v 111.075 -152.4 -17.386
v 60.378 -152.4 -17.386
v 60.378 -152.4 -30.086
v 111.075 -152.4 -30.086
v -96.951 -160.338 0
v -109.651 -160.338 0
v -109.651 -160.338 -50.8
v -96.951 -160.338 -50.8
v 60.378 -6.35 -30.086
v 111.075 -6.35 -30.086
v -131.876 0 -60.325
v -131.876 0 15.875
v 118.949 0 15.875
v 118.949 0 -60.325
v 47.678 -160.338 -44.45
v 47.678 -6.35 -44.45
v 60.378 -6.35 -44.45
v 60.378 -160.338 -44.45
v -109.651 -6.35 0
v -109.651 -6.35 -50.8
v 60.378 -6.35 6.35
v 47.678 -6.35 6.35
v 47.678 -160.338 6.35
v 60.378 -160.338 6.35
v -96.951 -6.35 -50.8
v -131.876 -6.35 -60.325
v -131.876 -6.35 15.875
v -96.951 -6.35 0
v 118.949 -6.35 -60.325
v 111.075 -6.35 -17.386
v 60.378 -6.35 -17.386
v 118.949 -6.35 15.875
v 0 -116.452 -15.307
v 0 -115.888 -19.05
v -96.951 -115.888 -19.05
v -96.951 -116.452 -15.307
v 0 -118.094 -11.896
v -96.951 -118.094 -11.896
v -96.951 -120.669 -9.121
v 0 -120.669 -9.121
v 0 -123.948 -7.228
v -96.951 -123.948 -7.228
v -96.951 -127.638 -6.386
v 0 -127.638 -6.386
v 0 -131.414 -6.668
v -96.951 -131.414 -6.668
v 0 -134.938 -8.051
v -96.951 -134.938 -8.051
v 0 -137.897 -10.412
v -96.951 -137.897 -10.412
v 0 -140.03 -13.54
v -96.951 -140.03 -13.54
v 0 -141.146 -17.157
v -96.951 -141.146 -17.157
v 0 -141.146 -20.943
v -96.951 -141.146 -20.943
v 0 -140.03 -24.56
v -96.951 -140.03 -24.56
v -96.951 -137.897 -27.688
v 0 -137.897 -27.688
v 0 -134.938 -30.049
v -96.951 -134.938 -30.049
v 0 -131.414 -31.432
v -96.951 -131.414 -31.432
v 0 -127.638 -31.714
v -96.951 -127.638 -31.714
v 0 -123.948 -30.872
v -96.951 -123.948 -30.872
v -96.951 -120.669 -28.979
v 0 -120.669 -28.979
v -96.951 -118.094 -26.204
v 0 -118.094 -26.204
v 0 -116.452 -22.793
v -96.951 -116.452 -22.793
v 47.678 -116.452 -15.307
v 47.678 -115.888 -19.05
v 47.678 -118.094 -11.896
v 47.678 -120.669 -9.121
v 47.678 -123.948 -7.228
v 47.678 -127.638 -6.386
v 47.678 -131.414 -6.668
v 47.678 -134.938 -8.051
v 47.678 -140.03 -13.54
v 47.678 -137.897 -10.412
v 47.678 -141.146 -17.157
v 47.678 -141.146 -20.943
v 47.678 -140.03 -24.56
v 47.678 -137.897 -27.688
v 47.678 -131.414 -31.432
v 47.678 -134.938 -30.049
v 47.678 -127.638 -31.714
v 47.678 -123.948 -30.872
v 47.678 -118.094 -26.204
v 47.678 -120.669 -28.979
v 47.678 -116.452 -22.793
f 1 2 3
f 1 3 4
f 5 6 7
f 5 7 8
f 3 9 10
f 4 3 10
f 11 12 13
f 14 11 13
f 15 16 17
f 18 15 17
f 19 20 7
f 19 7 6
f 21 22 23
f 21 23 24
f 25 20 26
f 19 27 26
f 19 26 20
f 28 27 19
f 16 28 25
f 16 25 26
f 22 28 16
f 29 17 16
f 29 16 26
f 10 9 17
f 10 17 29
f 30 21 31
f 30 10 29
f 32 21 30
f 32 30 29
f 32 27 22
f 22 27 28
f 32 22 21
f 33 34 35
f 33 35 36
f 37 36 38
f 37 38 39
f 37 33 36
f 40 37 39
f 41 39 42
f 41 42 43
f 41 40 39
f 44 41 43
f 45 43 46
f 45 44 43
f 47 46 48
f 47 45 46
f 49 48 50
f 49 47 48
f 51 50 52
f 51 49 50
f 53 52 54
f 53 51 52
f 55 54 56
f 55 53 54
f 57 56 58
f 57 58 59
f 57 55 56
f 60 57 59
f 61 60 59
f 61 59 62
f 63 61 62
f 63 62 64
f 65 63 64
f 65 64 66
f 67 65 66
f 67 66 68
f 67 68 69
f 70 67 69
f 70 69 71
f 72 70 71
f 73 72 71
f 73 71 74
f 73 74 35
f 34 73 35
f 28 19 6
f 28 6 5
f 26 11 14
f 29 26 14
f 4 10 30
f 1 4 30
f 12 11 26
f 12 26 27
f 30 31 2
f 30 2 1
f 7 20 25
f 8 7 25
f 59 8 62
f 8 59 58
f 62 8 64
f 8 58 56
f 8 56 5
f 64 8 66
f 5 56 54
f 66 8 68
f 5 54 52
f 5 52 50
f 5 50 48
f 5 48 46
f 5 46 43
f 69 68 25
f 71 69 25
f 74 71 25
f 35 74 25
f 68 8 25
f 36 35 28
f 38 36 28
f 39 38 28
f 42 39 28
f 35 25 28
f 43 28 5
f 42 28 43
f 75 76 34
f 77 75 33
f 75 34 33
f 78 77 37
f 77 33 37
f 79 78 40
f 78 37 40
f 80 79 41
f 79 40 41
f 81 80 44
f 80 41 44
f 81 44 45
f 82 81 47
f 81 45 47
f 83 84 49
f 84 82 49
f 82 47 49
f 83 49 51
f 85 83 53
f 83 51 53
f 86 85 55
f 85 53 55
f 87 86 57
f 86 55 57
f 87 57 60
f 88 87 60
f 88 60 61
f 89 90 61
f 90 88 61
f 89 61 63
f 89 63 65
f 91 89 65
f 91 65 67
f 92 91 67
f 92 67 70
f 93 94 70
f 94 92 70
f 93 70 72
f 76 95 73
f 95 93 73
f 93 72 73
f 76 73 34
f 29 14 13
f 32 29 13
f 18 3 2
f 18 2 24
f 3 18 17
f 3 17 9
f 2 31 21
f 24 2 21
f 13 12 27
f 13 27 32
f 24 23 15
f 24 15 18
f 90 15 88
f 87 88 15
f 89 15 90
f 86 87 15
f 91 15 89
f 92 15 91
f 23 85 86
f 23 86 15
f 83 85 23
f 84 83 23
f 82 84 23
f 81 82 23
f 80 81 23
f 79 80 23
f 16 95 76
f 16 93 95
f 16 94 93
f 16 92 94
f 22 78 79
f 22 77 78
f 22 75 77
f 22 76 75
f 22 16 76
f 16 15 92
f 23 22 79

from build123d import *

# Parameters (mm, degrees)
F0_W          = 250.825
F0_H          = 76.2
F0_W_2        = 12.7
F0_H_2        = 50.8
F1_DEPTH      = 6.35
F2_DEPTH      = 160.3375
F3_W          = 12.7
F3_H          = 50.8
F4_DEPTH      = 160.3375
F5_W          = 50.8
F5_H          = 12.7
F6_DEPTH      = 152.4
F7_R          = 12.7
F8_DEPTH      = 55.626
F8_DEPTH_BACK = 97.028


with BuildPart() as f1:
    # F0 (on Front) → F1 (new body)
    with BuildSketch(Plane.XZ):
        with Locations((-6.46369, -22.225)):
            Rectangle(F0_W, F0_H)
        with Locations((-103.30119, -25.4)):
            Rectangle(F0_W_2, F0_H_2, mode=Mode.SUBTRACT)
    extrude(amount=F1_DEPTH)

    # F0 (on Front) → F2 (join)
    with BuildSketch(Plane.XZ):
        with Locations((-103.30119, -25.4)):
            Rectangle(F0_W_2, F0_H_2)
    extrude(amount=F2_DEPTH)

    # F3 (on Front) → F4 (join)
    with BuildSketch(Plane.XZ):
        with Locations((54.02811, -19.05)):
            Rectangle(F3_W, F3_H)
    extrude(amount=F4_DEPTH)

    # F5 (on Front) → F6 (join)
    with BuildSketch(Plane.XZ):
        with Locations((85.67481, -23.736117)):
            Rectangle(F5_W, F5_H)
    extrude(amount=F6_DEPTH)

    # F7 (on Right) → F8 (join, two sides)
    with BuildSketch(Plane.YZ) as f8_sk:
        with Locations((-128.5875, -19.05)):
            Circle(F7_R)
    extrude(amount=F8_DEPTH)
    extrude(f8_sk.sketch, amount=-F8_DEPTH_BACK)


solid = f1.part
